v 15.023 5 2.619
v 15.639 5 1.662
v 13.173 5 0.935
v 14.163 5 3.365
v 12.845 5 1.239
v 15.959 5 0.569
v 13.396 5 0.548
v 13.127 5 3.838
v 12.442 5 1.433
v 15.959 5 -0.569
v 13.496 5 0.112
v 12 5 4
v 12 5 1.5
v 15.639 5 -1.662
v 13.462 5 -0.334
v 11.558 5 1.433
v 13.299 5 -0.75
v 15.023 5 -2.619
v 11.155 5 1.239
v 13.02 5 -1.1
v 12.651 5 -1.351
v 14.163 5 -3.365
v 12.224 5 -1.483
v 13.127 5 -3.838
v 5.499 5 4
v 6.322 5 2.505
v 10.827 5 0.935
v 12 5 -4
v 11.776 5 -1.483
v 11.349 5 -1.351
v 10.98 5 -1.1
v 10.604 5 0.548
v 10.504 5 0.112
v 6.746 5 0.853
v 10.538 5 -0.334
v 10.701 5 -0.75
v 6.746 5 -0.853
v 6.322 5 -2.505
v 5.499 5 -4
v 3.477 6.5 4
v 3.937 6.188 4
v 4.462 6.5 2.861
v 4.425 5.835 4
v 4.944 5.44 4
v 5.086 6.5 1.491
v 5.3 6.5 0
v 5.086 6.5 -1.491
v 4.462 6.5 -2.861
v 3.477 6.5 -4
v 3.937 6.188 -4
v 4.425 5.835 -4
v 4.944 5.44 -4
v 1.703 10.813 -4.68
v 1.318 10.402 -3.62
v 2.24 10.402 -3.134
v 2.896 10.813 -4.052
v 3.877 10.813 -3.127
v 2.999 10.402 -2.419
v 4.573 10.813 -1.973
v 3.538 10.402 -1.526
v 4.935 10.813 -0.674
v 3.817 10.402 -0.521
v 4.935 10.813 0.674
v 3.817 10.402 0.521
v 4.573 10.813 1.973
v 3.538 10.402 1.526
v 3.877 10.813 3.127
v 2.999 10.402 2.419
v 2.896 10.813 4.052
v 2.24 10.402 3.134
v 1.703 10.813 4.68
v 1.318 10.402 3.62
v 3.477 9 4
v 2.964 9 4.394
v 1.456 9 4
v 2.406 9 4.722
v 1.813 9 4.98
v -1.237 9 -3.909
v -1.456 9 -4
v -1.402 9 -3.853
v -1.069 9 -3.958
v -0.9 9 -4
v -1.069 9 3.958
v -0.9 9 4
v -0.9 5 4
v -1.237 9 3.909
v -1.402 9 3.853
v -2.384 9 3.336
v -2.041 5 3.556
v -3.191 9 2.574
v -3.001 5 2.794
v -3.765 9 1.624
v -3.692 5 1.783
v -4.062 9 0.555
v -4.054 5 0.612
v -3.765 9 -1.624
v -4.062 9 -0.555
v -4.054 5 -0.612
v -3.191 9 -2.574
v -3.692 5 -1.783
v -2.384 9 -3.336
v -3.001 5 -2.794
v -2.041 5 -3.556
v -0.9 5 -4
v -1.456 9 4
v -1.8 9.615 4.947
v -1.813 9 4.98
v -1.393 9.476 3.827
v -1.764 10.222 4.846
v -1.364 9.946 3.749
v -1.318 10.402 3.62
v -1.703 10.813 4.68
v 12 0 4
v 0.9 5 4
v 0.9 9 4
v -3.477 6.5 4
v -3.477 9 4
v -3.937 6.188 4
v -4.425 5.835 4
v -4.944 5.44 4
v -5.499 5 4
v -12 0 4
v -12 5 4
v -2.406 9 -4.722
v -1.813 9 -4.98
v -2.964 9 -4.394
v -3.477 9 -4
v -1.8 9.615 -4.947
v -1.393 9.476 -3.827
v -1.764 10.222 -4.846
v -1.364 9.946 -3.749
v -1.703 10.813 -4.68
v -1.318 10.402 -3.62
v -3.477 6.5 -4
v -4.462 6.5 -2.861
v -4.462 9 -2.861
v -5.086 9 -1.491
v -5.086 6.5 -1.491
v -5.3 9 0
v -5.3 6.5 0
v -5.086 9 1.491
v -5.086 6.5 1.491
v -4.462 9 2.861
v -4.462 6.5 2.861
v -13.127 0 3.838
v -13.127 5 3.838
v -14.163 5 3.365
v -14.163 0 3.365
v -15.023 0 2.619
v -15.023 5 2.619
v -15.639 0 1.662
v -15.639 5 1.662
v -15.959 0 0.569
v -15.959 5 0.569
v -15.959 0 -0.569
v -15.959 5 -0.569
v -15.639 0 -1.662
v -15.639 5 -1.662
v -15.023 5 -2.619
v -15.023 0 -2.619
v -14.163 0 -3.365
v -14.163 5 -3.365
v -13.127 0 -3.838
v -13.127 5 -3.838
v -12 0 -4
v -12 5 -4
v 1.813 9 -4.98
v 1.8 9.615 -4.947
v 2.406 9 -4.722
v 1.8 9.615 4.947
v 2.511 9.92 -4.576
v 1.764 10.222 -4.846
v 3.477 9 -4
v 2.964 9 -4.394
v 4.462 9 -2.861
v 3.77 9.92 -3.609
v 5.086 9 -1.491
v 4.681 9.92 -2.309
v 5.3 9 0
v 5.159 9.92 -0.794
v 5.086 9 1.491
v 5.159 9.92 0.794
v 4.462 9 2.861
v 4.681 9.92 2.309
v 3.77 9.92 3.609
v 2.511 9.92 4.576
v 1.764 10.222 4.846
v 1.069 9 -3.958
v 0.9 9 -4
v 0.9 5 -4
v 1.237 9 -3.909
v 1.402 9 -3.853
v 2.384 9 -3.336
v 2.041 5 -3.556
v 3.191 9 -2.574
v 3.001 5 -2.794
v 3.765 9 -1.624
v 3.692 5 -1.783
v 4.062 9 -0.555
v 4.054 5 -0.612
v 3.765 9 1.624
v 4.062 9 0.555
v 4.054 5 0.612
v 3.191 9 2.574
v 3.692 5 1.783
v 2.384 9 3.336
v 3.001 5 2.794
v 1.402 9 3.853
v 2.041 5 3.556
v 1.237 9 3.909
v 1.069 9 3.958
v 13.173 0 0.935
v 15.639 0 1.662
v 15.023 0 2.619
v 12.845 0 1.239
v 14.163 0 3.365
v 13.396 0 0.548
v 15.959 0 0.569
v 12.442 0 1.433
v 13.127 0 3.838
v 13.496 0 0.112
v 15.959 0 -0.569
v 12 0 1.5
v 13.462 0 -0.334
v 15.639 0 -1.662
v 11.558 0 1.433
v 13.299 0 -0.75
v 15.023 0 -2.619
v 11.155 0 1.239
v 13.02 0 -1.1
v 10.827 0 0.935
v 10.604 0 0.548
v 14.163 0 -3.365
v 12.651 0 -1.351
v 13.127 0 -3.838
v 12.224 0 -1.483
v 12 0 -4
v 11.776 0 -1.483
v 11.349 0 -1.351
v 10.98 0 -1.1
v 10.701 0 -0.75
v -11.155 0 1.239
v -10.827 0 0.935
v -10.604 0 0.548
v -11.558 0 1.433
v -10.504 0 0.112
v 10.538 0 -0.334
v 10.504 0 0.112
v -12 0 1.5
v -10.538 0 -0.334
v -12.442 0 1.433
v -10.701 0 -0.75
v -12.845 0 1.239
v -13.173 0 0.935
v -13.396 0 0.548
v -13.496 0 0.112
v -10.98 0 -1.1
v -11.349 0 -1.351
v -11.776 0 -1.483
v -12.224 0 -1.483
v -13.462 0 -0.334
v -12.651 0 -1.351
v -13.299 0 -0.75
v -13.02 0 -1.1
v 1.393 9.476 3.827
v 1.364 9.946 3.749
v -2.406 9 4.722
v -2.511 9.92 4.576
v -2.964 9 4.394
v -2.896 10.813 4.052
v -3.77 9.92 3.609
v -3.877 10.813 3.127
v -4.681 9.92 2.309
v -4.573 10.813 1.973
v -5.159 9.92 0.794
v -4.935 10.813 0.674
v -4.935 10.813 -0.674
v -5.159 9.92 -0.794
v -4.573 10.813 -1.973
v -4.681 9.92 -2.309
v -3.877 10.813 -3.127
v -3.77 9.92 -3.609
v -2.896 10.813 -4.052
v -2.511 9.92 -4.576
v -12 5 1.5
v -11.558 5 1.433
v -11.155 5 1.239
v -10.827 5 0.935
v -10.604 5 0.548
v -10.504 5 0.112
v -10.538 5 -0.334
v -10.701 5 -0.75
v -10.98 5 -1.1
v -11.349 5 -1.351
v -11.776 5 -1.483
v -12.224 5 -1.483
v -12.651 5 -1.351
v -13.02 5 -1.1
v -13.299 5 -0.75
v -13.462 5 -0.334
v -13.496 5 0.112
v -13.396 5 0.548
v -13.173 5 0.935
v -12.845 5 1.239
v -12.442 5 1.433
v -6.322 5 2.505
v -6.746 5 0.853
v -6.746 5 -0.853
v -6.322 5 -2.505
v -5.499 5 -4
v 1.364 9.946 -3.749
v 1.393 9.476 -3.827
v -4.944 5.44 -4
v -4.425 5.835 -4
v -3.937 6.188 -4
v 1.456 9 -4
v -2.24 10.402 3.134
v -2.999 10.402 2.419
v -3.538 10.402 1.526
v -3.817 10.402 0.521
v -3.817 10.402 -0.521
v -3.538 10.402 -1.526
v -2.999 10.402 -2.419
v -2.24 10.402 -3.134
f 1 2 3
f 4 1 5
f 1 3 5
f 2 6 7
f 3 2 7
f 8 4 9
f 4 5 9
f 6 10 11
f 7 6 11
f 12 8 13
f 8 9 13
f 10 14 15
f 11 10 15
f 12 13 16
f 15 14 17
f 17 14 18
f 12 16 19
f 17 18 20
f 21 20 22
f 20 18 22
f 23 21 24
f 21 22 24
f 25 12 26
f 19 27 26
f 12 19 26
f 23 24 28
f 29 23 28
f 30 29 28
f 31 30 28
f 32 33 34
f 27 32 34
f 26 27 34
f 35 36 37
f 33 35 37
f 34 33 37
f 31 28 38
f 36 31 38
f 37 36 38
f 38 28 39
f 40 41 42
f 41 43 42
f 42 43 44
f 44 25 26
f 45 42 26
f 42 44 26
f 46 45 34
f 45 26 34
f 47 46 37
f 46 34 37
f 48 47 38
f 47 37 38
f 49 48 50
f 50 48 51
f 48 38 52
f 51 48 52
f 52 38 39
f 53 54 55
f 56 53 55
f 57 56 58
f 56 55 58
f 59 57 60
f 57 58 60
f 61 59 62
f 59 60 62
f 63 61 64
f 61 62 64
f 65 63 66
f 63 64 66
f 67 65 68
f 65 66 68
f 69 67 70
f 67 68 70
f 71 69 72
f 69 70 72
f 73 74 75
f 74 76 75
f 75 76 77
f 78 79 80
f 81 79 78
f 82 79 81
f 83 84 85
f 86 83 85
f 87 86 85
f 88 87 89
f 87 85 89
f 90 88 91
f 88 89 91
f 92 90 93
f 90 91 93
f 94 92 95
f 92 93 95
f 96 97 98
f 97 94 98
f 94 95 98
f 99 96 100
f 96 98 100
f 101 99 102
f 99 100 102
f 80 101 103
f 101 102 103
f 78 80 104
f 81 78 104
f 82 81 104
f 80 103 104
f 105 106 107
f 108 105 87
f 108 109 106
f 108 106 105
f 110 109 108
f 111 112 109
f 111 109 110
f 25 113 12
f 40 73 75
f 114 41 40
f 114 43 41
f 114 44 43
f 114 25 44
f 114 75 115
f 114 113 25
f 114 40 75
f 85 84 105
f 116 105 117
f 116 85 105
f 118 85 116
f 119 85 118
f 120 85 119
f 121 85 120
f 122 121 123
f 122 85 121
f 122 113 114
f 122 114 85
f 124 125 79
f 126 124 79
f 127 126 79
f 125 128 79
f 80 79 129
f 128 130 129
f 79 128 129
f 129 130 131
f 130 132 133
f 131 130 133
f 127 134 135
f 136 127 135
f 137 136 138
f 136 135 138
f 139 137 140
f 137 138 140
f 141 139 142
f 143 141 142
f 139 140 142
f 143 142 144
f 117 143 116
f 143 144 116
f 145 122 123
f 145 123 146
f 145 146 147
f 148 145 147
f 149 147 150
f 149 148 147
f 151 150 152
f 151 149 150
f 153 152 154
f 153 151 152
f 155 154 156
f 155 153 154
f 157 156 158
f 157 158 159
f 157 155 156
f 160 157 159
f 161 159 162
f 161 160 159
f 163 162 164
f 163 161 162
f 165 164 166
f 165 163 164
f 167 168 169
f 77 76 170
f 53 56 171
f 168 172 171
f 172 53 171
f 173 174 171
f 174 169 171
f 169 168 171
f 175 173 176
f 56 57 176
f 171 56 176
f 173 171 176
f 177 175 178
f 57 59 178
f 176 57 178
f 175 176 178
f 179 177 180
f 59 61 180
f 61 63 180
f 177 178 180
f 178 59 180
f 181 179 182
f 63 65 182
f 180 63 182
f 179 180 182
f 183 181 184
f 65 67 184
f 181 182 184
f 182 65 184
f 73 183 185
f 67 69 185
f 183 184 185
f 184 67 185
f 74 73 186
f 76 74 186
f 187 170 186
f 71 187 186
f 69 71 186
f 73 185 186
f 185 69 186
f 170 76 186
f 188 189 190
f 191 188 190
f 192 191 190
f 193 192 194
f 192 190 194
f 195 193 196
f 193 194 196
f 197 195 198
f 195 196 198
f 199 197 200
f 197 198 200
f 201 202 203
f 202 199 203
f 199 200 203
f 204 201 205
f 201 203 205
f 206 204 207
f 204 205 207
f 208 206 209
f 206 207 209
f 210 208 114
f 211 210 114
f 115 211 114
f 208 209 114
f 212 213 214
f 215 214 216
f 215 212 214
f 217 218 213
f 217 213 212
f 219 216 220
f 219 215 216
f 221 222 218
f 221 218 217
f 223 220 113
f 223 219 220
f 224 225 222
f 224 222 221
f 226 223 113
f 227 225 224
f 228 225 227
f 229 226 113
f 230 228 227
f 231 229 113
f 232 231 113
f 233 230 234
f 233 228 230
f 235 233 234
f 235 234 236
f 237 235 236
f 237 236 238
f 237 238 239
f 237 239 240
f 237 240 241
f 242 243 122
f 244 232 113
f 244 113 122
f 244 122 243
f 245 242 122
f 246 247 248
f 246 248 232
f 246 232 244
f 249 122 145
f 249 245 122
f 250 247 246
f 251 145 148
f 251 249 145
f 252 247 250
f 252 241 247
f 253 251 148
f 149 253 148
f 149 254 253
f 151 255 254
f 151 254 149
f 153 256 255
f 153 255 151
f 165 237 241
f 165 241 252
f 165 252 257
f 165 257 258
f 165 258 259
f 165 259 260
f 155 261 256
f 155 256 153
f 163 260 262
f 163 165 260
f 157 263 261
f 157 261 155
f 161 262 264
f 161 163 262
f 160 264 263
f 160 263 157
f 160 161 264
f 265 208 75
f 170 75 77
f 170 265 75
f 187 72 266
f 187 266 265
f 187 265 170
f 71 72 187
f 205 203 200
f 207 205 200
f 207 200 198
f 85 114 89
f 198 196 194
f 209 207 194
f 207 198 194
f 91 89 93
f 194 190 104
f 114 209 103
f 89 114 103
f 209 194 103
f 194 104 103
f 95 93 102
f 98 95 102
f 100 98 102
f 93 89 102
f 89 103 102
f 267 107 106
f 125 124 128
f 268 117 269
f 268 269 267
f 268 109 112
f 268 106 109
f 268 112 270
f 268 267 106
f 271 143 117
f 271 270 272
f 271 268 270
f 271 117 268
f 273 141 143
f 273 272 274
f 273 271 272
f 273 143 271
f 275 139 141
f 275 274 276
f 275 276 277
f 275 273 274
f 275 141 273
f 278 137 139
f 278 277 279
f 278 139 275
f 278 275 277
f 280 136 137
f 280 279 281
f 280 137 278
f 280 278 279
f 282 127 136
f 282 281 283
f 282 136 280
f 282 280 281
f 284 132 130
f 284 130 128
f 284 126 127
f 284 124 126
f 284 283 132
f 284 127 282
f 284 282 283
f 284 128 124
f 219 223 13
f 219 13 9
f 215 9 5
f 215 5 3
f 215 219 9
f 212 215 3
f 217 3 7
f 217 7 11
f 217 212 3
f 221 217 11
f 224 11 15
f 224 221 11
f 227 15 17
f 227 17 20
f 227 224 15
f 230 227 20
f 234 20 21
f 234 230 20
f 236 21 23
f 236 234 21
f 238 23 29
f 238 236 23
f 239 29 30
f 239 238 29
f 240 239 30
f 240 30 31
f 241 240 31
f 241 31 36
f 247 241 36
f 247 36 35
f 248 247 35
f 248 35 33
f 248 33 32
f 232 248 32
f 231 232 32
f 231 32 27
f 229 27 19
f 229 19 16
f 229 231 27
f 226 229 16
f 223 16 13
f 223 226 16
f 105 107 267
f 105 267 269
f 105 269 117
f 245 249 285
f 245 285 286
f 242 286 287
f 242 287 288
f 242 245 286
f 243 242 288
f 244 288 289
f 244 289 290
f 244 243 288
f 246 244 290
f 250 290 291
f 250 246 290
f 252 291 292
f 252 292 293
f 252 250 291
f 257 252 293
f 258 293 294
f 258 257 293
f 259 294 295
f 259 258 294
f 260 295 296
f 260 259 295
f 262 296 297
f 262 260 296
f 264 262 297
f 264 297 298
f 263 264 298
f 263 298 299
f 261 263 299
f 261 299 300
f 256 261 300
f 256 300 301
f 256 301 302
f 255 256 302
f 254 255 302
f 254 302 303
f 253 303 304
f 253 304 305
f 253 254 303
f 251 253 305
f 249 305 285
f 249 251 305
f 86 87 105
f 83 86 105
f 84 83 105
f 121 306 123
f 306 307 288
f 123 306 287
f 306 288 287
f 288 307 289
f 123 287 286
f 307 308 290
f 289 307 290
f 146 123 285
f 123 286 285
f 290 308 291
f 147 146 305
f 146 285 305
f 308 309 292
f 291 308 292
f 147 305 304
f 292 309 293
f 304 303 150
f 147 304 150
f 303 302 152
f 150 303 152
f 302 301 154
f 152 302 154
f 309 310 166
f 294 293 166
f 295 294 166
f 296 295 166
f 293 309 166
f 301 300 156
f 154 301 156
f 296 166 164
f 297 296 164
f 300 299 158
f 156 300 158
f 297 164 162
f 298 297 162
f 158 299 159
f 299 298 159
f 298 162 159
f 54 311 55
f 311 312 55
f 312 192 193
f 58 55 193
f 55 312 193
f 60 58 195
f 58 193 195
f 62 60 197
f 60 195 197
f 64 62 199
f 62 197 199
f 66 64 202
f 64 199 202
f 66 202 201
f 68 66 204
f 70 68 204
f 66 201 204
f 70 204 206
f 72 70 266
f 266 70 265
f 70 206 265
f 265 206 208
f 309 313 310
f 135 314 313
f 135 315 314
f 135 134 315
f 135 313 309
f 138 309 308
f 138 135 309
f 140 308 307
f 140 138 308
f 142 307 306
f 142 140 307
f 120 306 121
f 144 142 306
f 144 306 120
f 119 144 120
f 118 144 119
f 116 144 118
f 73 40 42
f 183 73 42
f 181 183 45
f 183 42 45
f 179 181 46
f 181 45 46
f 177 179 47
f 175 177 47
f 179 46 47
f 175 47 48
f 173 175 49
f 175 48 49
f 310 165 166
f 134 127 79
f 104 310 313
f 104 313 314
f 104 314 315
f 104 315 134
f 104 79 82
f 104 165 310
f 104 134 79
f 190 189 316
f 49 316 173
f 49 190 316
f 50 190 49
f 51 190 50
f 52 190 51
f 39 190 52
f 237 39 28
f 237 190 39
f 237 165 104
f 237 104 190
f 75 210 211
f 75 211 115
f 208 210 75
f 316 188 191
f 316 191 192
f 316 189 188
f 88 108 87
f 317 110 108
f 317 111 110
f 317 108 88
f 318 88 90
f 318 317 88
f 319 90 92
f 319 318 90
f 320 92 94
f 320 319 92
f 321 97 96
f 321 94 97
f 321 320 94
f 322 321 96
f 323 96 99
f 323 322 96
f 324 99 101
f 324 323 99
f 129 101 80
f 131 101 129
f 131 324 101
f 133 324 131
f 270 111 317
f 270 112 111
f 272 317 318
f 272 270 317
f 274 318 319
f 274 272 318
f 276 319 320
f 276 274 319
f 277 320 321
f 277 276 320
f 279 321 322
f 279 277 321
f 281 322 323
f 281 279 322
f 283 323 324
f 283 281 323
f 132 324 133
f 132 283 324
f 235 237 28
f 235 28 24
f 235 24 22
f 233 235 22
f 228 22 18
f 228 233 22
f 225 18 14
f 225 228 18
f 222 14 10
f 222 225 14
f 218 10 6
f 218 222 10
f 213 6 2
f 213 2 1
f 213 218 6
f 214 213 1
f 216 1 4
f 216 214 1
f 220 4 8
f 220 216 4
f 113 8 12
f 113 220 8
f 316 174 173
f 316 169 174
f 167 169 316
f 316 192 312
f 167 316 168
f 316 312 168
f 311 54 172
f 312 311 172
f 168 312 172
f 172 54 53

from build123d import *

# Parameters (mm, degrees)
CROQUIS1_R                  = 1.5
SALIENTE_EXTRUIR1_DEPTH     = 5
SALIENTE_EXTRUIR2_DEPTH     = 4
REVOLUCI_N1_ANGLE           = 70
REVOLUCI_N1_OTHER_WAY_ANGLE = 70
REVOLUCI_N2_ANGLE           = 70
REVOLUCI_N2_OTHER_WAY_ANGLE = 70
CHAFL_N1_SIZE               = 1.5


with BuildPart() as part:
    # Croquis1 → Saliente-Extruir1 (new body)
    with BuildSketch(Plane(origin=(0, 0, 0), x_dir=(1, 0, 0), z_dir=(0, 1, 0))):
        with BuildLine():
            Line((-12, 4), (12, 4))
            ThreePointArc((12, 4), (16, 0), (12, -4))
            Line((12, -4), (-12, -4))
            ThreePointArc((-12, -4), (-16, 0), (-12, 4))
        make_face()
        with Locations(Location((12, 0, 0), (0, 0, 270))):
            Circle(CROQUIS1_R, mode=Mode.SUBTRACT)
        with Locations(Location((-12, 0, 0), (0, 0, 270))):
            Circle(CROQUIS1_R, mode=Mode.SUBTRACT)
    extrude(amount=SALIENTE_EXTRUIR1_DEPTH)

    # Croquis2 → Saliente-Extruir2 (add)
    with BuildSketch(Plane(origin=(0, 5, 0), x_dir=(1, 0, 0), z_dir=(0, 1, 0))):
        with BuildLine():
            Line((-3.47706773, -4), (-0.9, -4))
            ThreePointArc((-0.9, -4), (-4.1, 0), (-0.9, 4))
            Line((-0.9, 4), (-3.47706773, 4))
            ThreePointArc((-3.47706773, 4), (-5.3, 0), (-3.47706773, -4))
        make_face()
        with BuildLine():
            Line((0.9, -4), (3.47706773, -4))
            ThreePointArc((3.47706773, -4), (5.3, 0), (3.47706773, 4))
            Line((3.47706773, 4), (0.9, 4))
            ThreePointArc((0.9, 4), (4.1, 0), (0.9, -4))
        make_face()
    extrude(amount=SALIENTE_EXTRUIR2_DEPTH)

    # Croquis4 → Revolución1 (revolve)
    with BuildSketch(Plane.XY):
        with BuildLine():
            Line((4.1, 9), (5.3, 9))
            ThreePointArc((5.3, 9), (5.219481091, 9.920335342), (4.98037089, 10.81270676))
            Line((4.98037089, 10.81270676), (3.852739745, 10.402282588))
            ThreePointArc((3.852739745, 10.402282588), (4.037711787, 9.711957528), (4.1, 9))
        make_face()
    revolve(axis=Axis((0, 9, 0), (0, 1, 0)), revolution_arc=REVOLUCI_N1_ANGLE)

    # Croquis4 → Revolución1 other way (revolve)
    with BuildSketch(Plane.XY):
        with BuildLine():
            Line((4.1, 9), (5.3, 9))
            ThreePointArc((5.3, 9), (5.219481091, 9.920335342), (4.98037089, 10.81270676))
            Line((4.98037089, 10.81270676), (3.852739745, 10.402282588))
            ThreePointArc((3.852739745, 10.402282588), (4.037711787, 9.711957528), (4.1, 9))
        make_face()
    revolve(axis=Axis((0, 9, 0), (0, -1, 0)), revolution_arc=REVOLUCI_N1_OTHER_WAY_ANGLE)

    # Croquis5 → Revolución2 (revolve)
    with BuildSketch(Plane.XY):
        with BuildLine():
            Line((-5.3, 9), (-4.1, 9))
            ThreePointArc((-4.1, 9), (-4.037711787, 9.711957528), (-3.852739745, 10.402282588))
            Line((-3.852739745, 10.402282588), (-4.98037089, 10.81270676))
            ThreePointArc((-4.98037089, 10.81270676), (-5.219481091, 9.920335342), (-5.3, 9))
        make_face()
    revolve(axis=Axis((0, 9, 0), (0, 1, 0)), revolution_arc=REVOLUCI_N2_ANGLE)

    # Croquis5 → Revolución2 other way (revolve)
    with BuildSketch(Plane.XY):
        with BuildLine():
            Line((-5.3, 9), (-4.1, 9))
            ThreePointArc((-4.1, 9), (-4.037711787, 9.711957528), (-3.852739745, 10.402282588))
            Line((-3.852739745, 10.402282588), (-4.98037089, 10.81270676))
            ThreePointArc((-4.98037089, 10.81270676), (-5.219481091, 9.920335342), (-5.3, 9))
        make_face()
    revolve(axis=Axis((0, 9, 0), (0, -1, 0)), revolution_arc=REVOLUCI_N2_OTHER_WAY_ANGLE)

    # Chaflán1
    chafl_n1_edges = [part.edges().sort_by_distance(p)[0] for p in [
        (-5.3, 5, 0),
        (5.3, 5, 0),
    ]]
    chamfer(chafl_n1_edges, length=CHAFL_N1_SIZE)


solid = part.part
